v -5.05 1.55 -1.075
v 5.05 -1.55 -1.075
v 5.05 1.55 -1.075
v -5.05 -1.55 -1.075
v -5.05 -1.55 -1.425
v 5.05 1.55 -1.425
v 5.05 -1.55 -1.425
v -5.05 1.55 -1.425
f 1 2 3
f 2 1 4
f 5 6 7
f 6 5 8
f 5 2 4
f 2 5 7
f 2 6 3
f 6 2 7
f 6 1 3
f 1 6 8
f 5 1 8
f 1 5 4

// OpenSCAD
use <lib.scad>

hd=24;
ld=12;
vld=8;

module container() {
	translate([0,0,1.5]) box([3,7,3]);
}

module containerGap() {
	translate([0,0,1.5]) box([3.02,7.02,3.02]);
}

module towerHD() {
	translate([0,0,6]) union() {
		cyl(0.5,0.5,12,$fn=hd);
		translate([0,0,-5.5]) cyl(1,1,1,$fn=hd);
		translate([0,0,5.5]) box([1,10,1]);
	}
}

module towerLD() {
	translate([0,0,6]) union() {
		cyl(0.5,0.5,12,$fn=ld);
		translate([0,0,-5.5]) cyl(1,1,1,$fn=ld);
		translate([0,0,5.5]) box([1,10,1]);
	}
}

module towerVLD() {
	translate([0,0,6]) union() {
		cyl(0.5,0.5,12,$fn=vld);
		translate([0,0,5.5]) box([1,10,1]);
	}
}

//towerHD();
//towerLD();
//towerVLD();

module tower2HD() {
	translate([0,0,9]) union() {
		cyl(0.5,0.5,18,$fn=hd);
		translate([0,0,-8.5]) cyl(1,1,1,$fn=hd);
		translate([0,0,8.5]) box([1,10,1]);
	}
}

module tower2LD() {
	translate([0,0,9]) union() {
		cyl(0.5,0.5,18,$fn=ld);
		translate([0,0,-8.5]) cyl(1,1,1,$fn=ld);
		translate([0,0,8.5]) box([1,10,1]);
	}
}

module tower2VLD() {
	translate([0,0,9]) union() {
		cyl(0.5,0.5,18,$fn=vld);
		translate([0,0,8.5]) box([1,10,1]);
	}
}

//tower2HD();
//tower2LD();
//tower2VLD();

module stopHD() {
	union() {
		translate([0,0,6]) union() {
			translate([0,4.5,0]) cyl(0.5,0.5,12,$fn=hd);
			translate([0,-4.5,0]) cyl(0.5,0.5,12,$fn=hd);
			translate([0,4.5,-5.5]) cyl(1,1,1,$fn=hd);
			translate([0,-4.5,-5.5]) cyl(1,1,1,$fn=hd);
			translate([0,0,5.5]) box([1,11,1]);
		}
		difference() {
			translate([0,0,11.5]) box([9,10,0.5]);
			translate([-3,0,11]) containerGap();
			translate([3,0,11]) containerGap();
		}
		box([9.1,7.1,0.1]);
	}
}

module stopLD() {
	union() {
		translate([0,0,6]) union() {
			translate([0,4.5,0]) cyl(0.5,0.5,12,$fn=ld);
			translate([0,-4.5,0]) cyl(0.5,0.5,12,$fn=ld);
			translate([0,4.5,-5.5]) cyl(1,1,1,$fn=ld);
			translate([0,-4.5,-5.5]) cyl(1,1,1,$fn=ld);
			translate([0,0,5.5]) box([1,11,1]);
		}
		difference() {
			translate([0,0,11.5]) box([9,10,0.5]);
			translate([-3,0,11]) containerGap();
			translate([3,0,11]) containerGap();
		}
		box([9.1,7.1,0.1]);
	}
}

module stopVLD() {
	union() {
		translate([0,0,6]) union() {
			translate([0,4.5,0]) cyl(0.5,0.5,11.5,$fn=ld);
			translate([0,-4.5,0]) cyl(0.5,0.5,11.5,$fn=ld);
//			translate([0,4.5,-5.5]) cyl(1,1,1,$fn=ld);
//			translate([0,-4.5,-5.5]) cyl(1,1,1,$fn=ld);
//			translate([0,0,5.5]) box([1,11,1]);
		}
		difference() {
			translate([0,0,11.5]) box([9,10,0.5]);
//			translate([-3,0,11]) containerGap();
//			translate([3,0,11]) containerGap();
		}
//		box([9.1,7.1,0.1]);
	}
}

//stopHD();
//stopLD();
//stopVLD();

module carHD() {
	union() {
		intersection() {
			difference() {
				translate([0,0,-0.5]) rbox([10,3,2], 0.05, $fn=8);
				translate([0,0,1]) box([7.1,4,4]);
			}
		}
		translate([0,1,-1.5]) rbox([8,0.51,1], 0.05, $fn=8);
		translate([0,-1,-1.5]) rbox([8,0.51,1], 0.05, $fn=8);
		translate([4.4,0,0.15]) cyl(0.3, 0.3, 1.0, $fn=16);
	}
}

module cabHD() {
	translate([4.4,0,0.15]) difference() {
		rbox([1.5,2.8,1.0], 0.05, $fn=8);
		cyl(0.3, 0.3, 2.0, $fn=16);
	}
}

module stripeHD() {
	translate([0,0,-1.25]) rbox([10.1,3.1,0.35], 0.05, $fn=8);
}

module stripeLD() {
	translate([0,0,-1.25]) box([10.1,3.1,0.35]);
}

module carLD() {
	union() {
		intersection() {
			difference() {
				translate([0,0,-0.5]) box([10,3,2]);
				translate([0,0,1]) box([7.1,4,4]);
			}
		}
		translate([0,1,-1.5]) box([8,0.51,1]);
		translate([0,-1,-1.5]) box([8,0.51,1]);
		translate([4.4,0,0.15]) cyl(0.3, 0.3, 1.0, $fn=8);
	}
}

module cabLD() {
	translate([4.4,0,0.15]) difference() {
		box([1.5,2.8,1.0]);
		cyl(0.3, 0.3, 2.0, $fn=8);
	}
}

//carHD();
//carLD();
//cabHD();
//cabLD();
//stripeHD();
stripeLD();
//rotate([0,0,90]) translate([0,0,-0.95]) container();
